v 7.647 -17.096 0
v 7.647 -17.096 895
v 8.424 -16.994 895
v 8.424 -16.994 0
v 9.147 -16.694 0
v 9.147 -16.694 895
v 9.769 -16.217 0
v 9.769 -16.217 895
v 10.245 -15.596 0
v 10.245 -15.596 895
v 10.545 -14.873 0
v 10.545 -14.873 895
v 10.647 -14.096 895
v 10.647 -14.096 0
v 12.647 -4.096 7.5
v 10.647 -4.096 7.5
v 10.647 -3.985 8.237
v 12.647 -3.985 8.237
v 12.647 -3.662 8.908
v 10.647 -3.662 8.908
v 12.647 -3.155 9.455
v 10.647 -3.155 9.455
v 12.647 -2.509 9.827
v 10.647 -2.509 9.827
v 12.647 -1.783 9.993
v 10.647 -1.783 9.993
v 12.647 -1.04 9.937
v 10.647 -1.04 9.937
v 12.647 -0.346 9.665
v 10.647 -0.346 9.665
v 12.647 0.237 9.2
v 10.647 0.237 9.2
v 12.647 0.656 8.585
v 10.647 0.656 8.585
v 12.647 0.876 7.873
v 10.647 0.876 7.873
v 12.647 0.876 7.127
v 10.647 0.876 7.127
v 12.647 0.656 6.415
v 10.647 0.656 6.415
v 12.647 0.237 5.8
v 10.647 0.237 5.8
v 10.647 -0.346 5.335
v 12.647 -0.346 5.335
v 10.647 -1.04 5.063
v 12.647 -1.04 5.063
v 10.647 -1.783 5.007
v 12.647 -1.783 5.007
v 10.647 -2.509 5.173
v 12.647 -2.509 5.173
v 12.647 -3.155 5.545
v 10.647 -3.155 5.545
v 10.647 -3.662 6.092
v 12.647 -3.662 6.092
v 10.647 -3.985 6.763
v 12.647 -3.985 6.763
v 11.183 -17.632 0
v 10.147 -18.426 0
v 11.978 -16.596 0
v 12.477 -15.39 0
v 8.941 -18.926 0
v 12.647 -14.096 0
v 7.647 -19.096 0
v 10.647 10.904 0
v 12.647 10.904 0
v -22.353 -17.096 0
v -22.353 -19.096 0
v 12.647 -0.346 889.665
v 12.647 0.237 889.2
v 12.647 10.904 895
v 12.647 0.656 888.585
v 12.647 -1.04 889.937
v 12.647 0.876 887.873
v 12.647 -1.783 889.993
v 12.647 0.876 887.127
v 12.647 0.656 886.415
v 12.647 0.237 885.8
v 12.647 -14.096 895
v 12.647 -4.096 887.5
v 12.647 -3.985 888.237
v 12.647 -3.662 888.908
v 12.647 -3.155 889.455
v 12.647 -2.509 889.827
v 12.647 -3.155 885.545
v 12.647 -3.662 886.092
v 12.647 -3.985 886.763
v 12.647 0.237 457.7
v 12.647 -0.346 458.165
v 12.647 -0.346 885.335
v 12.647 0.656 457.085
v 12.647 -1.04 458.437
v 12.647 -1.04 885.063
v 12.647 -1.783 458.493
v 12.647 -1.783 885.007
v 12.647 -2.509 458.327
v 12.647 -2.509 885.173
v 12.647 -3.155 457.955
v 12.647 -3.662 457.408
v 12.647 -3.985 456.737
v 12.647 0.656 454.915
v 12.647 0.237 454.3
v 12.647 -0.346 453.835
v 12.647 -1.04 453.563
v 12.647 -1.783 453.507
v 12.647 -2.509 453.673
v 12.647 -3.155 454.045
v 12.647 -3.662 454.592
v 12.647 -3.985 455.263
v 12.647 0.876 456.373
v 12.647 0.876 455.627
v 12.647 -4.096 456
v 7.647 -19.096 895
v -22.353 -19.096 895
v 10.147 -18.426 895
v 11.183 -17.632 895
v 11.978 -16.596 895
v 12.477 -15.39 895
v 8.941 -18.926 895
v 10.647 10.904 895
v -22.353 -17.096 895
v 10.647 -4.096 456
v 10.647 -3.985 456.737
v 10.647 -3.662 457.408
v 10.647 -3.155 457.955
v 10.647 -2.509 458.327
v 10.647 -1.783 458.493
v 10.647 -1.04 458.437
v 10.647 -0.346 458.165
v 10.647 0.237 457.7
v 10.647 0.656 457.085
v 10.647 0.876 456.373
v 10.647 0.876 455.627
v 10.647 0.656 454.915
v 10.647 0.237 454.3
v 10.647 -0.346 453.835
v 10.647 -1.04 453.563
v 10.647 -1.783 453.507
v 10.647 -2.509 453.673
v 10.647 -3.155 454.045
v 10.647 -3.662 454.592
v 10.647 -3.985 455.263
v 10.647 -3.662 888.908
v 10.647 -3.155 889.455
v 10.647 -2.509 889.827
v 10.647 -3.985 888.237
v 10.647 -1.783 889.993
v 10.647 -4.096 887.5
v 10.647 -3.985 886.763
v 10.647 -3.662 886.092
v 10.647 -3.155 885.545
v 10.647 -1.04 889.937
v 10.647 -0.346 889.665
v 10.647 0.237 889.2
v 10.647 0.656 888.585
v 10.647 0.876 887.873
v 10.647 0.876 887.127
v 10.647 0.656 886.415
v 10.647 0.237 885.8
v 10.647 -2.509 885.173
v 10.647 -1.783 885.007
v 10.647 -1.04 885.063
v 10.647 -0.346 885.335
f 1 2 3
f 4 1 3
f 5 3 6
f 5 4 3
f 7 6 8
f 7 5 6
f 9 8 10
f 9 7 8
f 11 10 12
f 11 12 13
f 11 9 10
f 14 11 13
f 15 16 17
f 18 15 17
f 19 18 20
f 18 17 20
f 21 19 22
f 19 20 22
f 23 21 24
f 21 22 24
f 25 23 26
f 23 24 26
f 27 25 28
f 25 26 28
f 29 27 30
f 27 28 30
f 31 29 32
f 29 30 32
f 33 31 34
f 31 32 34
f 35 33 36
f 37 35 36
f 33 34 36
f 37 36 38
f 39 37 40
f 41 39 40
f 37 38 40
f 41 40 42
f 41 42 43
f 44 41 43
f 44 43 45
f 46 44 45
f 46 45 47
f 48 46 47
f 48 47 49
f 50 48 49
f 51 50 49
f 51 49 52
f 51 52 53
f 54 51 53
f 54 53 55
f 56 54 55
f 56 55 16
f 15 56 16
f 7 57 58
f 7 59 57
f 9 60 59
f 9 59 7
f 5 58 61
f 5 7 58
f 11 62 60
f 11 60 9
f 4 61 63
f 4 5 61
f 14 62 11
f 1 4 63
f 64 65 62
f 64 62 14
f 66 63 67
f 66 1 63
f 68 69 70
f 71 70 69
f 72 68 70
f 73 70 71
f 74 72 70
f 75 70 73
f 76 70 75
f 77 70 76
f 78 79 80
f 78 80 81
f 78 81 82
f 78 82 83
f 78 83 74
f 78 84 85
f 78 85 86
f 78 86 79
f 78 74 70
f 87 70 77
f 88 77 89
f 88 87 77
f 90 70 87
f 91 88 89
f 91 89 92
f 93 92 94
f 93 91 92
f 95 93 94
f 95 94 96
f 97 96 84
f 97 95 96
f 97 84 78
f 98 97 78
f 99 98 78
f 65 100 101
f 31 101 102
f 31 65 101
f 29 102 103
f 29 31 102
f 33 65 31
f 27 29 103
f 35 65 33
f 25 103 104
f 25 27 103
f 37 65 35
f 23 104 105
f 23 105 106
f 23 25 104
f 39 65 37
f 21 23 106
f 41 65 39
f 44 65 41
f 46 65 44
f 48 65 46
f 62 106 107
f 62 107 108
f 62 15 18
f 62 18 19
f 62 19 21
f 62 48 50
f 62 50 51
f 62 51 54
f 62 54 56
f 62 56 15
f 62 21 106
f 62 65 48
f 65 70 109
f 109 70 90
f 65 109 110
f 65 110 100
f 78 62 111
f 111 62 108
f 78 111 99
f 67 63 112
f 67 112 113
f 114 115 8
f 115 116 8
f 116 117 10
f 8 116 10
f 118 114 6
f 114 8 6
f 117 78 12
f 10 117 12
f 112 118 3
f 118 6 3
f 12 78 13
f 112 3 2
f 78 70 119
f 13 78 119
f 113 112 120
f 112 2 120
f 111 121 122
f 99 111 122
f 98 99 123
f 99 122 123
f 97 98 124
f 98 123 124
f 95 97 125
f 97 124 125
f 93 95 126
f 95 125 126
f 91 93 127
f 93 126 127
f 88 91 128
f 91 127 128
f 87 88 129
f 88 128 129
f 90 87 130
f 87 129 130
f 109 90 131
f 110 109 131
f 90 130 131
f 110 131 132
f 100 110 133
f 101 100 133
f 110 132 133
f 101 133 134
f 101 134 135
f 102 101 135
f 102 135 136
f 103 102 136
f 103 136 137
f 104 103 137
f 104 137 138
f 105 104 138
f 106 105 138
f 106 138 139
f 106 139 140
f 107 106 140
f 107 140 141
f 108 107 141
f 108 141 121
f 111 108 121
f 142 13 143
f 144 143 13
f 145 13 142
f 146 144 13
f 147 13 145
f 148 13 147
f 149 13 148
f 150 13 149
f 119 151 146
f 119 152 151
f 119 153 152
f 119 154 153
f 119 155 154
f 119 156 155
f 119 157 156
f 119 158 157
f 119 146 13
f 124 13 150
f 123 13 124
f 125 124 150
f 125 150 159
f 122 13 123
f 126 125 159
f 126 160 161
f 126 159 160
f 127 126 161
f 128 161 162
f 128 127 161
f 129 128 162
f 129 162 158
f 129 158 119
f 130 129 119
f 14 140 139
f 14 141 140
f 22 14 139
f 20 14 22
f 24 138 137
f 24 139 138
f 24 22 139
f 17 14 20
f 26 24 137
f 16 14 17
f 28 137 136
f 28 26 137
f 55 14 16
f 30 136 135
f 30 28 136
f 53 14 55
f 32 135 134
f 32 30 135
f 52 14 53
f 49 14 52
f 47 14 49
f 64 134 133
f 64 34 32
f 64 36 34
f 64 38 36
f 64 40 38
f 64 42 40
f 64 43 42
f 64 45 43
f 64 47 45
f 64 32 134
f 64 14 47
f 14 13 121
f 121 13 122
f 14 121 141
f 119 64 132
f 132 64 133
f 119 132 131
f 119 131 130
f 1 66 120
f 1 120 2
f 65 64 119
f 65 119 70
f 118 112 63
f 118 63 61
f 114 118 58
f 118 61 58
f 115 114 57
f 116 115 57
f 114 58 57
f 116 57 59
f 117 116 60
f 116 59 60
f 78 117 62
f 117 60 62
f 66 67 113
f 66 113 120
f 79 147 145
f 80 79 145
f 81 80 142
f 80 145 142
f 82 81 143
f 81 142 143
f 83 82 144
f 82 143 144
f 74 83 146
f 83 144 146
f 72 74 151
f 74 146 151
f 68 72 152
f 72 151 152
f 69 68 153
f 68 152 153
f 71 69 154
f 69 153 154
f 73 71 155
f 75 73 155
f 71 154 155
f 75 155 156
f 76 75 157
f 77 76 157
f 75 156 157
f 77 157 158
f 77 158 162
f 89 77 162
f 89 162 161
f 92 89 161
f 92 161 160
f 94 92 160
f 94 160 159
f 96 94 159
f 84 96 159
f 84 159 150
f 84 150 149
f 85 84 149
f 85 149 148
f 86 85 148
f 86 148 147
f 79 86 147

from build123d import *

# Parameters (mm, degrees)
PAD_DEPTH    = 895
SKETCH001_R  = 2.5
POCKET_DEPTH = 5


with BuildPart() as part:
    # Sketch → Pad (new body)
    with BuildSketch(Plane.XY):
        with BuildLine():
            Line((10.647392, 10.903953), (12.647392, 10.903953))
            Line((12.647392, 10.903953), (12.647392, -14.096047))
            ThreePointArc((7.647392, -19.096047), (11.182926, -17.631581), (12.647392, -14.096047))
            Line((7.647392, -19.096047), (-22.352608, -19.096047))
            Line((-22.352608, -19.096047), (-22.352608, -17.096047))
            Line((-22.352608, -17.096047), (7.647392, -17.096047))
            ThreePointArc((7.647392, -17.096047), (9.768712, -16.217368), (10.647392, -14.096047))
            Line((10.647392, -14.096047), (10.647392, 10.903953))
        make_face()
    extrude(amount=PAD_DEPTH)

    # Sketch001 → Pocket (cut)
    with BuildSketch(Plane(origin=(10.647392, 0, 0), x_dir=(0, -1, 0), z_dir=(-1, 0, 0))):
        with Locations((1.596047, 7.5)):
            Circle(SKETCH001_R)
        with Locations((1.596047, 456)):
            Circle(SKETCH001_R)
        with Locations((1.596047, 887.5)):
            Circle(SKETCH001_R)
    extrude(amount=-POCKET_DEPTH, mode=Mode.SUBTRACT)


solid = part.part
